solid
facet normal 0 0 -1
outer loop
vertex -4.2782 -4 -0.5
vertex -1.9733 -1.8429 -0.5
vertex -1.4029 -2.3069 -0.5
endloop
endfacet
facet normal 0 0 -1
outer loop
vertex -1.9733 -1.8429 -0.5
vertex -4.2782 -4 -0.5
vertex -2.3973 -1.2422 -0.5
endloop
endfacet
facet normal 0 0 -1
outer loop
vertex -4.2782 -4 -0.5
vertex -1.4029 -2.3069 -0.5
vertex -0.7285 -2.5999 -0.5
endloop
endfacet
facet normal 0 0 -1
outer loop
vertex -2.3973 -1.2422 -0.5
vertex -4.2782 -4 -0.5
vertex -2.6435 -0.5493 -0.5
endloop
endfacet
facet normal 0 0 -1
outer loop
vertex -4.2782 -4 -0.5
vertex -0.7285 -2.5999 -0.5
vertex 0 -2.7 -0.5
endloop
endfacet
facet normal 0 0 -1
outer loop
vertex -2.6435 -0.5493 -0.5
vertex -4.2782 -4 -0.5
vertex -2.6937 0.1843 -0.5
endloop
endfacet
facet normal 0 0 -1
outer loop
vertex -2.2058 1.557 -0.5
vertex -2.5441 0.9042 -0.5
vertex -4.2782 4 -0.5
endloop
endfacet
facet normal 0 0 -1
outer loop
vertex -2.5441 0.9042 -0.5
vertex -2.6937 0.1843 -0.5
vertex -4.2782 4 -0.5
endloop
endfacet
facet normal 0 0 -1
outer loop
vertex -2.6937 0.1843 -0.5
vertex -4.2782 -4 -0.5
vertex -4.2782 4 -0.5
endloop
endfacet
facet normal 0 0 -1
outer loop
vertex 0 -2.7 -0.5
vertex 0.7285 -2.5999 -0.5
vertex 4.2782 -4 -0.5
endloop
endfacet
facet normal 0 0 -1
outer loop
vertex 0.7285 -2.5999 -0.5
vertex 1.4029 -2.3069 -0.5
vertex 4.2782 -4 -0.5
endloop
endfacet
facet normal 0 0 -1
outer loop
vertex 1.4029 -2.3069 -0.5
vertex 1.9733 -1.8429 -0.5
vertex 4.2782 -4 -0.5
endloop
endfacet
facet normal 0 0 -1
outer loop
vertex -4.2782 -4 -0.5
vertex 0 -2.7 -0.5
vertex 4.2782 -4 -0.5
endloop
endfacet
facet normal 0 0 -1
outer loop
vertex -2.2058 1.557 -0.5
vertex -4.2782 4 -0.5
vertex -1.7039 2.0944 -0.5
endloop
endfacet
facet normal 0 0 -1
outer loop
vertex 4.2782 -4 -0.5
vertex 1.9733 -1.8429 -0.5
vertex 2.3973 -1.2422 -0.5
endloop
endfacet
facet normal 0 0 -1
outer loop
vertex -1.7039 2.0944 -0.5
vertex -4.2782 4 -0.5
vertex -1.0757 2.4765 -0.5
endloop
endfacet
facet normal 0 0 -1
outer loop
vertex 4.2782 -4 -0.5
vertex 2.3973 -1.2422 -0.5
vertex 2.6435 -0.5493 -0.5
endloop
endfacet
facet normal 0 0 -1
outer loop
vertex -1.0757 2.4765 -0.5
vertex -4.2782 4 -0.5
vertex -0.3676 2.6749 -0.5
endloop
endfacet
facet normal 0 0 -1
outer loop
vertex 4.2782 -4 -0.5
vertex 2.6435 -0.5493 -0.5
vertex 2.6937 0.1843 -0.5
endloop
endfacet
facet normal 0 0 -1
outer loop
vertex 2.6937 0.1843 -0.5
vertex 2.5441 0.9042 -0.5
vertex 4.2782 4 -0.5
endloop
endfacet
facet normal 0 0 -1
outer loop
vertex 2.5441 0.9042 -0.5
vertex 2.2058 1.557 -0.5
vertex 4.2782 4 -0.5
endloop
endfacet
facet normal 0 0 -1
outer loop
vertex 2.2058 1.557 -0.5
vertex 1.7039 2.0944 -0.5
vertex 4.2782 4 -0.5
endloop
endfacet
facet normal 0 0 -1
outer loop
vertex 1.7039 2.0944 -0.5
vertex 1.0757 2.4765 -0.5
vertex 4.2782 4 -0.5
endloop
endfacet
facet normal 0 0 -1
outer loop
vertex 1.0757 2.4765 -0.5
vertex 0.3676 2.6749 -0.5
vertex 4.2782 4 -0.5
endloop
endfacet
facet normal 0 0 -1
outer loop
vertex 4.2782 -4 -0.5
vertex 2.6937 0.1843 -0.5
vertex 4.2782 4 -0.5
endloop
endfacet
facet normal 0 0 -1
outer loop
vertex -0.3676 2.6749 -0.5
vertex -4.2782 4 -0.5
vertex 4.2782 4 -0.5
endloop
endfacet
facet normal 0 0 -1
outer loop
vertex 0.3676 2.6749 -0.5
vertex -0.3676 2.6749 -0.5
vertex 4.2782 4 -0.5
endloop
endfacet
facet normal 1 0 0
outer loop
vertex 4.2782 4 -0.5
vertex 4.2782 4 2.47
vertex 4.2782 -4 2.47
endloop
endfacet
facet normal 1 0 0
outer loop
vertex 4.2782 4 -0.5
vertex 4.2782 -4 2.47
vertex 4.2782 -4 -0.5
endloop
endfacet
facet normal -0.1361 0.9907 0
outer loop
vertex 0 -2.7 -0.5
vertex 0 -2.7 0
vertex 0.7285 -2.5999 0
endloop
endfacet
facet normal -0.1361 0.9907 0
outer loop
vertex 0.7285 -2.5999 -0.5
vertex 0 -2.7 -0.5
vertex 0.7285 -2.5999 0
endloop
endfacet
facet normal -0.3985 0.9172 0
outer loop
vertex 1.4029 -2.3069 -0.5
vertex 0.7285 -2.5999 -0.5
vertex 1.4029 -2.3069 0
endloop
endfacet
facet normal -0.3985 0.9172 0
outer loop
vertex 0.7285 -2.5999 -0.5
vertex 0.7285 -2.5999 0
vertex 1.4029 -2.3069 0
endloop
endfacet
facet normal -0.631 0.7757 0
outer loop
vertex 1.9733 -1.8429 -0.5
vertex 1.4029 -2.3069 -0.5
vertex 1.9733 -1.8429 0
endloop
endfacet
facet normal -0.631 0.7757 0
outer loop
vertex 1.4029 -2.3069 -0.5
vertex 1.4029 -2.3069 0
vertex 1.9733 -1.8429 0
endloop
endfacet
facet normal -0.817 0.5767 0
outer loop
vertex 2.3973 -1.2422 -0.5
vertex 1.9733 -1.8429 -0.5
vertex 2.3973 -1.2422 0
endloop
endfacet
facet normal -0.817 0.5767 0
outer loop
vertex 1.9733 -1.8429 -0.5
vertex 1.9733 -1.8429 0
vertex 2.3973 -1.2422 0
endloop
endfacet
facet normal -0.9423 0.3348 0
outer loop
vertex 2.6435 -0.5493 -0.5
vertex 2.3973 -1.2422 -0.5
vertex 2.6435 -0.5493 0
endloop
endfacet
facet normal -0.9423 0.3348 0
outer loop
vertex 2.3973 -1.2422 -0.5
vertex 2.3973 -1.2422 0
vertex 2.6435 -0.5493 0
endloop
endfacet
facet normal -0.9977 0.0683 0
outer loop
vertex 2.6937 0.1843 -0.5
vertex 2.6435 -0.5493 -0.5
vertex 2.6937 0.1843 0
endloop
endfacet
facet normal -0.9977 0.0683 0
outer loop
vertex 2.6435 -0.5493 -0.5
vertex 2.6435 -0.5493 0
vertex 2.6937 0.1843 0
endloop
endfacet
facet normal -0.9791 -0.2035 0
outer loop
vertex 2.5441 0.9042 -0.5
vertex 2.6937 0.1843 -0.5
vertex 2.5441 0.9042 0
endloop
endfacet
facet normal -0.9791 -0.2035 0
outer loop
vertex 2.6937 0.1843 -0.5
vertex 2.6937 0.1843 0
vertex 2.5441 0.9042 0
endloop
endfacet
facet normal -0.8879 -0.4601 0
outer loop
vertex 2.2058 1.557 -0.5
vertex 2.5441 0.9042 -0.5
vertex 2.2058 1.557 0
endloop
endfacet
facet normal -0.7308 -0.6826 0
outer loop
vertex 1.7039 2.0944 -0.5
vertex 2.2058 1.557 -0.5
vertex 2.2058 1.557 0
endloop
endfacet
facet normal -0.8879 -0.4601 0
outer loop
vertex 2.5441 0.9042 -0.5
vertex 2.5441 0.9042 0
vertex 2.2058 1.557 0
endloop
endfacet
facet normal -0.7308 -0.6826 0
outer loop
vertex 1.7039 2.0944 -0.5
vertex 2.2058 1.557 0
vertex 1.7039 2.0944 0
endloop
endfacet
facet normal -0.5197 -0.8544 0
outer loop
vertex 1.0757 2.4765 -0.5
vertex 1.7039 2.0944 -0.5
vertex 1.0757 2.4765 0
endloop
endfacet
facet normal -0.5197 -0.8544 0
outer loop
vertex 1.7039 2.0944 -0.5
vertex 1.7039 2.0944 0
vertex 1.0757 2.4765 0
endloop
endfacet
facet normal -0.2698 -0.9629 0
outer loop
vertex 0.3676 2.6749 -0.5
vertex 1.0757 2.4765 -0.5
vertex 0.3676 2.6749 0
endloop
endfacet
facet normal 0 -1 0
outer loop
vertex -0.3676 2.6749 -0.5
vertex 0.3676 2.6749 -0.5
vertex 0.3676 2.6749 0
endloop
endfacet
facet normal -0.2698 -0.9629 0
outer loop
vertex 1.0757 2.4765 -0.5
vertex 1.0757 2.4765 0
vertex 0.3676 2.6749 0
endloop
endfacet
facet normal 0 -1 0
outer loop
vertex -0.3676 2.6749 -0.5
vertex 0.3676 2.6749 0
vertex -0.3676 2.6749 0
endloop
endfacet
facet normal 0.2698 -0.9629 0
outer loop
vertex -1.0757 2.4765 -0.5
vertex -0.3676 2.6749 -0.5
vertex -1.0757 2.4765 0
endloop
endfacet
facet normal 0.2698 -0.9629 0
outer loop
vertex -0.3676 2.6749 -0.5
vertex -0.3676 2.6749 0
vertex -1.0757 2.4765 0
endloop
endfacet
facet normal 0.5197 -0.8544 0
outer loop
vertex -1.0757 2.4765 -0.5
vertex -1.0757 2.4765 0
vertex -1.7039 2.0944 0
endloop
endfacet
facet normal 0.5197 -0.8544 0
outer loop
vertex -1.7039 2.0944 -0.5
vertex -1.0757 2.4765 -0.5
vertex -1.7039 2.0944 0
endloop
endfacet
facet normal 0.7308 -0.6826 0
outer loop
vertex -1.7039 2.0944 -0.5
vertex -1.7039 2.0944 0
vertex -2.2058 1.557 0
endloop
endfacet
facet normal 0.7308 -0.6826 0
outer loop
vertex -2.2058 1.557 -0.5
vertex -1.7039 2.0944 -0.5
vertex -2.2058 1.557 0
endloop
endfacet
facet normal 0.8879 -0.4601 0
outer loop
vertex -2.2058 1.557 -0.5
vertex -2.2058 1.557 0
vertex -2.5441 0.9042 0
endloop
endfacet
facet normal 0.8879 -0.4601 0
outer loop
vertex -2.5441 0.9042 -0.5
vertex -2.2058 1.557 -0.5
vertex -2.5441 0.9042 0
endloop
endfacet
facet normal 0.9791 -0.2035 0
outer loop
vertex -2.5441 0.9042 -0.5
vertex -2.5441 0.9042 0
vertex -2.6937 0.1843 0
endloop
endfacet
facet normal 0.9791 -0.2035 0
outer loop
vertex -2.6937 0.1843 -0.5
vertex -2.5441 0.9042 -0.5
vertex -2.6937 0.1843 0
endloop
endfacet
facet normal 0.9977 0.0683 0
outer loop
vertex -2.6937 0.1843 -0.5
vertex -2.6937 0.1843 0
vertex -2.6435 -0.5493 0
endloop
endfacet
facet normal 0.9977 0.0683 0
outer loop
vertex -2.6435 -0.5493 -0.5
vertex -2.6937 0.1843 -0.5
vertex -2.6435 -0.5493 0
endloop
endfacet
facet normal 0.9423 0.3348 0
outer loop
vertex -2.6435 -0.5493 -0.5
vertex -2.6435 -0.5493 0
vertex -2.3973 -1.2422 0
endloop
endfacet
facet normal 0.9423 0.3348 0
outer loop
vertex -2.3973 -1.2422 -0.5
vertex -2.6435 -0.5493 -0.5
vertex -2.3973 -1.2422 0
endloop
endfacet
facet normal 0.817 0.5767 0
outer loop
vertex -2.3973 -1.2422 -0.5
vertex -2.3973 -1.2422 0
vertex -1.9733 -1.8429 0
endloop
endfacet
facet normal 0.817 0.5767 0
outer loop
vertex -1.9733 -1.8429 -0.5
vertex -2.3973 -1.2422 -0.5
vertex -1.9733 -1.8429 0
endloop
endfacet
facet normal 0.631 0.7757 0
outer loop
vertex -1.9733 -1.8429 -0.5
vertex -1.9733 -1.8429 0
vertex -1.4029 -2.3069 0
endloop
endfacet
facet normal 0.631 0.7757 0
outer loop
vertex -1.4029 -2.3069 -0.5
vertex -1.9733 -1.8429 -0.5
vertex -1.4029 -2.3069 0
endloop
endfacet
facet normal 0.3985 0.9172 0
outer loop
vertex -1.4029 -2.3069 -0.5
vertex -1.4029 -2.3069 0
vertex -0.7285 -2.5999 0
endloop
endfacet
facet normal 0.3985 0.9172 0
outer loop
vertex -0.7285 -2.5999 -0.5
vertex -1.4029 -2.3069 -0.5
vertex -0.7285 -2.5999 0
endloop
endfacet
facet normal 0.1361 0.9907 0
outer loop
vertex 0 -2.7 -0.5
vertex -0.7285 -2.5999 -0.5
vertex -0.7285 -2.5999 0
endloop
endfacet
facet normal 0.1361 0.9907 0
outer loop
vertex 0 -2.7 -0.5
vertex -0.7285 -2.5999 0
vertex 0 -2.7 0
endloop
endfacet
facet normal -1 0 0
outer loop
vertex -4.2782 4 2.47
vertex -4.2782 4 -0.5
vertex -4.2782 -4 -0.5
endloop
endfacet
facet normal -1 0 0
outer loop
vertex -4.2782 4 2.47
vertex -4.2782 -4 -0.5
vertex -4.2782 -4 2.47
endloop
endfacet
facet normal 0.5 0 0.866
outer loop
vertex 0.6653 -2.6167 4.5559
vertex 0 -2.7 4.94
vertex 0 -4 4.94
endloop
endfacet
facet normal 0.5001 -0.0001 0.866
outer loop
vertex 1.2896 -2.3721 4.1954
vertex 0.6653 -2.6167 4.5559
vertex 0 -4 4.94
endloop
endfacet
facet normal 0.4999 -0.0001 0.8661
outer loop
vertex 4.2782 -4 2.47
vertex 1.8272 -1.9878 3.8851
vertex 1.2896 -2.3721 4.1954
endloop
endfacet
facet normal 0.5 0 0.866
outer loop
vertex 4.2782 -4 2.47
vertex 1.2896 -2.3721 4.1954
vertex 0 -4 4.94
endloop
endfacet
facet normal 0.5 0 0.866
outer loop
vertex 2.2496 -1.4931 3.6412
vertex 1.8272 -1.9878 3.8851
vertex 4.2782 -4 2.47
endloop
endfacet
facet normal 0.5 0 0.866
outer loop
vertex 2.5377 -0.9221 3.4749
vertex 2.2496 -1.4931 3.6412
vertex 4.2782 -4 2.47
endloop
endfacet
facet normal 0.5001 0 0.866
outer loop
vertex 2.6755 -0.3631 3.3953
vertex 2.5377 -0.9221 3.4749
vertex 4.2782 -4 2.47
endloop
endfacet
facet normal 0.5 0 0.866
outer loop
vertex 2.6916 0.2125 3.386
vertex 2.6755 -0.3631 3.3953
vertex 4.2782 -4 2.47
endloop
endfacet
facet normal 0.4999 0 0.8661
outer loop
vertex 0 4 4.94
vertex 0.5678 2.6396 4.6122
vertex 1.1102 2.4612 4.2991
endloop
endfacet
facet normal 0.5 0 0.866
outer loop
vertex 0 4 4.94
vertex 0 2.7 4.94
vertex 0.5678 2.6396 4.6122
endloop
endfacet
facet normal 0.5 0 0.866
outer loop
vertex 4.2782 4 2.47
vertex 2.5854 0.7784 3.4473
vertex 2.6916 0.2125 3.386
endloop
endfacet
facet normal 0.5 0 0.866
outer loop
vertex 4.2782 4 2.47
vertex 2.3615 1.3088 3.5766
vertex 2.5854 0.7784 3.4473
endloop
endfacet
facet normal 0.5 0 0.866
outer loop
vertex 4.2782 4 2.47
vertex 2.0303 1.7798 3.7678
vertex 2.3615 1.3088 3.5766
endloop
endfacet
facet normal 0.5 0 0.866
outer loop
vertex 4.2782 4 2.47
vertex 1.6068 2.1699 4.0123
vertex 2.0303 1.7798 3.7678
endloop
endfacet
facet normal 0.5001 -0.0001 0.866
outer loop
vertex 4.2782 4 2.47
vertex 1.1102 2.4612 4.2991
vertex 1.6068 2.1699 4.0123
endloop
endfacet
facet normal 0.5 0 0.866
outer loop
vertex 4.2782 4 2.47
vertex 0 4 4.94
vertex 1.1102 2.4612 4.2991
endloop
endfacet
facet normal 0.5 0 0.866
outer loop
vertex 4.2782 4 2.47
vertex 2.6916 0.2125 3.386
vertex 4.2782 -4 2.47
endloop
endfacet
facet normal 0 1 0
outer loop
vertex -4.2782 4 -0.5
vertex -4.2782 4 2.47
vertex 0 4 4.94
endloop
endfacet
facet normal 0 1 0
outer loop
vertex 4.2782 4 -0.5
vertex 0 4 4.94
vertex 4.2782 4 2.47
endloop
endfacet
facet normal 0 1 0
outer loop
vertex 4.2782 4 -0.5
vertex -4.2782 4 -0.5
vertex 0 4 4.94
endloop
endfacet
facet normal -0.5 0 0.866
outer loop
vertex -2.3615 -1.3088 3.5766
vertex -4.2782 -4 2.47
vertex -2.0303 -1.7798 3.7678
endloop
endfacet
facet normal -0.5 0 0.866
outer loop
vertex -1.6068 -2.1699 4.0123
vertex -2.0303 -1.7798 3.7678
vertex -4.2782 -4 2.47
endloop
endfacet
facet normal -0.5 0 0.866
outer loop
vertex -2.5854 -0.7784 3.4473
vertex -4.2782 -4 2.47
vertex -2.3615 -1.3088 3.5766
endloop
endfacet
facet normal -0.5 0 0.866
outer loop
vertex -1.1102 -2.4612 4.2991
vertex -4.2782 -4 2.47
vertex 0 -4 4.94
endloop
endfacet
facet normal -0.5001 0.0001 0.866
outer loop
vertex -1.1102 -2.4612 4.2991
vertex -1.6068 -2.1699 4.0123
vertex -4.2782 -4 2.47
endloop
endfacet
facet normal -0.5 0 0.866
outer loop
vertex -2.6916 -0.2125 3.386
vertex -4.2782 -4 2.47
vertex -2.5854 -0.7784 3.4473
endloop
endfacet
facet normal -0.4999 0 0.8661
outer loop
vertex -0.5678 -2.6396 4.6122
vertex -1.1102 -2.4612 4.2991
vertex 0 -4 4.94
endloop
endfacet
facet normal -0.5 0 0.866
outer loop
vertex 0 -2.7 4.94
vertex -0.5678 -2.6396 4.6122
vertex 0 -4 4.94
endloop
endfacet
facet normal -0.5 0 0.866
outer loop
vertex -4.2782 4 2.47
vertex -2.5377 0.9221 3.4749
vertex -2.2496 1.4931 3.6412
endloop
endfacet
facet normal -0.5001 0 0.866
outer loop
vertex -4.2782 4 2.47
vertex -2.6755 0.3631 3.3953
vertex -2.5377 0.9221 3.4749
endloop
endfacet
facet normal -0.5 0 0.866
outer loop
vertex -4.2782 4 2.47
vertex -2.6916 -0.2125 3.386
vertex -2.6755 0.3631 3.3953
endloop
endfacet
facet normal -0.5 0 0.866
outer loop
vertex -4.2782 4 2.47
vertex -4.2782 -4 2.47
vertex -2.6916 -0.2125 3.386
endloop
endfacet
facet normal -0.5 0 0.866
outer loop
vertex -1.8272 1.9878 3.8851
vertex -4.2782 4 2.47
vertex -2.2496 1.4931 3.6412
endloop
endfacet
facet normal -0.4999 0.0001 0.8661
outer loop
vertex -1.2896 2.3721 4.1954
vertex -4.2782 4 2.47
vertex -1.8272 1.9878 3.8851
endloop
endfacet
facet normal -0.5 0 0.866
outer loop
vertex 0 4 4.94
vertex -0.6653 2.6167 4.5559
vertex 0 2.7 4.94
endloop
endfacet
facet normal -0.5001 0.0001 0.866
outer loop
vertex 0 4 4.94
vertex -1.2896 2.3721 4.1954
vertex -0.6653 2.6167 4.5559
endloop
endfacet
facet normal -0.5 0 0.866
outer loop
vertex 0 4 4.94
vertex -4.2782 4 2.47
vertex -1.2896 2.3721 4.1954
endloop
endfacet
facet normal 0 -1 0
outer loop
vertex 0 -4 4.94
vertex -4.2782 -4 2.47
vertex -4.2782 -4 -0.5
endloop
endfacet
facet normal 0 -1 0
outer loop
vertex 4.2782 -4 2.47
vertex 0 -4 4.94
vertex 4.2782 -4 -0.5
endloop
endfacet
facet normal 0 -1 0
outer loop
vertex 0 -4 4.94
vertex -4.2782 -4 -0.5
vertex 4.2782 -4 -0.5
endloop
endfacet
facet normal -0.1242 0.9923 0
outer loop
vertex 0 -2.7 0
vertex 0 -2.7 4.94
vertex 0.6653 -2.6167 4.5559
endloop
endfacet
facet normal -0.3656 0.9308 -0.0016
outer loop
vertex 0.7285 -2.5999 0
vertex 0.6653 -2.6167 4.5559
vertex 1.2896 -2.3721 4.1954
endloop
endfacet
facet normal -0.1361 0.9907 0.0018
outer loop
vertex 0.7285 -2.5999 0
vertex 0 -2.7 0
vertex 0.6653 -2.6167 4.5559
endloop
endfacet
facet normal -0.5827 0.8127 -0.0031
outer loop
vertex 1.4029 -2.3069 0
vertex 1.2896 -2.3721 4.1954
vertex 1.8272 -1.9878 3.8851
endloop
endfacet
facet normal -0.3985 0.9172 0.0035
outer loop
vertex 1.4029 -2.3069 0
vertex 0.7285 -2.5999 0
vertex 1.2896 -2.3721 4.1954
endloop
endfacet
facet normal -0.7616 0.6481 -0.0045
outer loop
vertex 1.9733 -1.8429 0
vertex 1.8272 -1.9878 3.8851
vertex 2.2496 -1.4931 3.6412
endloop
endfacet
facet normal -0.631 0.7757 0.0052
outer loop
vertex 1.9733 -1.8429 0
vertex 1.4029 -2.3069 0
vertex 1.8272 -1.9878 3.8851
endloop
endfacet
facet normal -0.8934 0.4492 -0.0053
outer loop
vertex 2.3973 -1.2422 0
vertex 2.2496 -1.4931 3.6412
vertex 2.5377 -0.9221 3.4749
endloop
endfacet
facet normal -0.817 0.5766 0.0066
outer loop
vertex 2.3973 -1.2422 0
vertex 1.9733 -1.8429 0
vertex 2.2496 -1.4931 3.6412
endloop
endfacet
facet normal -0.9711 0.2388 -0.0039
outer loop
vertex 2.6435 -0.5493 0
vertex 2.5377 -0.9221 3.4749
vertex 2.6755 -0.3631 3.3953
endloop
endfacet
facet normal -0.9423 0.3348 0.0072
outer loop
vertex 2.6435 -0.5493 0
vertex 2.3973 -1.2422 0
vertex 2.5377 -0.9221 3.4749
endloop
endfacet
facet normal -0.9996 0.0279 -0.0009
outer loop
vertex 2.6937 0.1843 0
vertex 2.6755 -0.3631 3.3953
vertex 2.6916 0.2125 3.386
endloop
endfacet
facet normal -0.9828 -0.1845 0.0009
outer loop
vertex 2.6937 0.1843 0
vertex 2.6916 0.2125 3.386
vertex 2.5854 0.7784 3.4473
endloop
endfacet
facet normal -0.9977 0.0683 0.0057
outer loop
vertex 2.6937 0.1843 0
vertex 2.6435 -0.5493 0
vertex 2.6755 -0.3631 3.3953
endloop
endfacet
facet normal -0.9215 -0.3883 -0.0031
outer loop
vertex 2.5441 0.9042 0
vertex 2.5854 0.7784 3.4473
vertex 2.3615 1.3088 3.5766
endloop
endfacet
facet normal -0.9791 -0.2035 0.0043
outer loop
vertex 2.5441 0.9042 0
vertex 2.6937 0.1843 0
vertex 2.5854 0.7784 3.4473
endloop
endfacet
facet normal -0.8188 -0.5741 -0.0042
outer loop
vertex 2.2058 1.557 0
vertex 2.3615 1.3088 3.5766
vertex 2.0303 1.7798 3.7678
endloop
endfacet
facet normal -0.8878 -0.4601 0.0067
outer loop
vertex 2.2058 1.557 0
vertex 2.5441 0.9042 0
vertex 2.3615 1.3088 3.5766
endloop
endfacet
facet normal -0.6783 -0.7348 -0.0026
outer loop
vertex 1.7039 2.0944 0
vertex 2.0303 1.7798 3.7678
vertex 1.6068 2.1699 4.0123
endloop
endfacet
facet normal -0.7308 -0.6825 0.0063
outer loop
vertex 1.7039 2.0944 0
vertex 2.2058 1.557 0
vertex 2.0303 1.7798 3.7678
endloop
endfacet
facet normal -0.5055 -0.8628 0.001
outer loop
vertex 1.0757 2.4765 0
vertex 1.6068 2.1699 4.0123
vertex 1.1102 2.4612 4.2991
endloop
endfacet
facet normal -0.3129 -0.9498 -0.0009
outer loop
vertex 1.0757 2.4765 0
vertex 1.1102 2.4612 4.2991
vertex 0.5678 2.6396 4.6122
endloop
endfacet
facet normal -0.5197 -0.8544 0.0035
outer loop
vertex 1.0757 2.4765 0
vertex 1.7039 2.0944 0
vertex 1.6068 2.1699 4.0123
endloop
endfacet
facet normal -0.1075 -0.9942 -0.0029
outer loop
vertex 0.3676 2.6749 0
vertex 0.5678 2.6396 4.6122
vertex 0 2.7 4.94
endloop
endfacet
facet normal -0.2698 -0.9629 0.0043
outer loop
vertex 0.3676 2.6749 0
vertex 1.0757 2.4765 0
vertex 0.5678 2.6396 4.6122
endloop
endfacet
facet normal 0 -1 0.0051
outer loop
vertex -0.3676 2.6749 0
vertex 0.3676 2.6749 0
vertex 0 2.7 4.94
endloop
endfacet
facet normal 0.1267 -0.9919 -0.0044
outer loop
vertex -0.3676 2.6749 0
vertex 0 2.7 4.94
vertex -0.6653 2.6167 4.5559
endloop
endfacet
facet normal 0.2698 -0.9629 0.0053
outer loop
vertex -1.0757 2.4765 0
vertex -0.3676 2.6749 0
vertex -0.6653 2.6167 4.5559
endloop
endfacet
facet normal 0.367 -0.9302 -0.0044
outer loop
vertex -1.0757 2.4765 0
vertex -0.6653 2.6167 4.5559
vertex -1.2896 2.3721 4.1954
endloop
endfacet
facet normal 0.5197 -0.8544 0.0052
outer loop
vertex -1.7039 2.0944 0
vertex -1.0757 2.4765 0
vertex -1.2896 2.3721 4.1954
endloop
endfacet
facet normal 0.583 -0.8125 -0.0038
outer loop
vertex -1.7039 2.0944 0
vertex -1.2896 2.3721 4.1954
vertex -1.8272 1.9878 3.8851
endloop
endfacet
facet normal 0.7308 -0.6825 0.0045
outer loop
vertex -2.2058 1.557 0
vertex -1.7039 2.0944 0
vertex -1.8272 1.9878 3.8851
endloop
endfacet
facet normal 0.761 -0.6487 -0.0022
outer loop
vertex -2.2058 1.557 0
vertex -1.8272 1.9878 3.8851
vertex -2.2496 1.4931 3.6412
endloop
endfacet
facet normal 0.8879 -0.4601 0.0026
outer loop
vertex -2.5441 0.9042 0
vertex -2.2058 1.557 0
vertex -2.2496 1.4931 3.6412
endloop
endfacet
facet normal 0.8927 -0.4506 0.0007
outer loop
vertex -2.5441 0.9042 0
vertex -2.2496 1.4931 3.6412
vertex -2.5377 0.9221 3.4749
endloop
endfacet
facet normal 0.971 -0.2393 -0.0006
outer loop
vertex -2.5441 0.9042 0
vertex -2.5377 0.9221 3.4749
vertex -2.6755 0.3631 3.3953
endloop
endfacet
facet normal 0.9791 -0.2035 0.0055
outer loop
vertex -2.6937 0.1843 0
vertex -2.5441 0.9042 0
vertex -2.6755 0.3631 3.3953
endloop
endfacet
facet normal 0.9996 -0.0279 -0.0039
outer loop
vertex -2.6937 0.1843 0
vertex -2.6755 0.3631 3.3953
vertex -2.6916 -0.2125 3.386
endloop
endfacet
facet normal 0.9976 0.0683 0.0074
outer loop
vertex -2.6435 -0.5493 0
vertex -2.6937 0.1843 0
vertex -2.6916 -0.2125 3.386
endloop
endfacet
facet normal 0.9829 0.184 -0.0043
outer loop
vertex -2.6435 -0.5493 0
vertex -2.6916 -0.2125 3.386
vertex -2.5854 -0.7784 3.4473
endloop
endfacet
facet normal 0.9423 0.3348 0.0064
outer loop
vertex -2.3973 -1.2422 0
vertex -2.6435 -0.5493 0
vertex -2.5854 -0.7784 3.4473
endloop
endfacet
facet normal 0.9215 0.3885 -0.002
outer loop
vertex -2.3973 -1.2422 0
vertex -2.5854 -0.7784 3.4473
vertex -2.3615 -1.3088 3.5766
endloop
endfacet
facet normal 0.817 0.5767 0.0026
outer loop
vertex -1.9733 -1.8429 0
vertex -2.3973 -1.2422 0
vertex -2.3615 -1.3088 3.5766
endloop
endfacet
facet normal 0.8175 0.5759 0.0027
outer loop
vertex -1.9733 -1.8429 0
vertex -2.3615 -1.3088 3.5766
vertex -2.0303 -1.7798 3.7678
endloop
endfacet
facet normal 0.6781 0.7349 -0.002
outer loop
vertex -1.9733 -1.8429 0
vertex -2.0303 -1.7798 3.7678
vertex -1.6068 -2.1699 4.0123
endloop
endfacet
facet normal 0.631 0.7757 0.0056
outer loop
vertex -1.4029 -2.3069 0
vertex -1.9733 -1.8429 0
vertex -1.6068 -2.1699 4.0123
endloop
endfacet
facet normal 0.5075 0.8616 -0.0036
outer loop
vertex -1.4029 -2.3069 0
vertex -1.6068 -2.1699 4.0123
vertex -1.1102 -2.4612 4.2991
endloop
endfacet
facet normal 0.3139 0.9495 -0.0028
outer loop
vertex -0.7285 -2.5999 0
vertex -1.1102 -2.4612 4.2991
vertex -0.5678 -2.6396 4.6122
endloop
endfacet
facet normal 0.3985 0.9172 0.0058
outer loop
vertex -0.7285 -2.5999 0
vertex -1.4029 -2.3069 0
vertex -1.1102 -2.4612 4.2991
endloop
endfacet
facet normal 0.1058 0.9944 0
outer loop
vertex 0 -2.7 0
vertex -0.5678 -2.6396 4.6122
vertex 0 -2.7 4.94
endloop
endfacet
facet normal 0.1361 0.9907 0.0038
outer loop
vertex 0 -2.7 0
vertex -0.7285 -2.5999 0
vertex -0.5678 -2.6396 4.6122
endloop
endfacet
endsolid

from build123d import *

# Parameters (mm, degrees)
BOSS_EXTRUDE1_DEPTH     = 4
SKETCH2_R               = 2.7
CUT_EXTRUDE2_DEPTH      = 8.662003654
CUT_EXTRUDE2_DEPTH_BACK = 8.662003654


with BuildPart() as part:
    # Sketch1 → Boss-Extrude1 (new, symmetric)
    with BuildSketch(Plane(origin=(0, 0, 0), x_dir=(1, 0, 0), z_dir=(0, 1, 0))):
        Polygon((4.278165495, -2.47), (4.278165495, 2.47), (0, 4.94), (-4.278165495, 2.47), (-4.278165495, -2.47), (0, -4.94), align=None)
    extrude(amount=BOSS_EXTRUDE1_DEPTH, both=True)

    # SurfaceCut1
    split(bisect_by=Plane.XY.offset(-0.5), keep=Keep.TOP)

    # Sketch2 → Cut-Extrude2 (cut, two sides)
    with BuildSketch(Plane.XY) as cut_extrude2_sk:
        with Locations(Location((0, 0, 0), (0, 0, 270))):
            Circle(SKETCH2_R)
    extrude(amount=CUT_EXTRUDE2_DEPTH, mode=Mode.SUBTRACT)
    extrude(cut_extrude2_sk.sketch, amount=-CUT_EXTRUDE2_DEPTH_BACK, mode=Mode.SUBTRACT)


solid = part.part
